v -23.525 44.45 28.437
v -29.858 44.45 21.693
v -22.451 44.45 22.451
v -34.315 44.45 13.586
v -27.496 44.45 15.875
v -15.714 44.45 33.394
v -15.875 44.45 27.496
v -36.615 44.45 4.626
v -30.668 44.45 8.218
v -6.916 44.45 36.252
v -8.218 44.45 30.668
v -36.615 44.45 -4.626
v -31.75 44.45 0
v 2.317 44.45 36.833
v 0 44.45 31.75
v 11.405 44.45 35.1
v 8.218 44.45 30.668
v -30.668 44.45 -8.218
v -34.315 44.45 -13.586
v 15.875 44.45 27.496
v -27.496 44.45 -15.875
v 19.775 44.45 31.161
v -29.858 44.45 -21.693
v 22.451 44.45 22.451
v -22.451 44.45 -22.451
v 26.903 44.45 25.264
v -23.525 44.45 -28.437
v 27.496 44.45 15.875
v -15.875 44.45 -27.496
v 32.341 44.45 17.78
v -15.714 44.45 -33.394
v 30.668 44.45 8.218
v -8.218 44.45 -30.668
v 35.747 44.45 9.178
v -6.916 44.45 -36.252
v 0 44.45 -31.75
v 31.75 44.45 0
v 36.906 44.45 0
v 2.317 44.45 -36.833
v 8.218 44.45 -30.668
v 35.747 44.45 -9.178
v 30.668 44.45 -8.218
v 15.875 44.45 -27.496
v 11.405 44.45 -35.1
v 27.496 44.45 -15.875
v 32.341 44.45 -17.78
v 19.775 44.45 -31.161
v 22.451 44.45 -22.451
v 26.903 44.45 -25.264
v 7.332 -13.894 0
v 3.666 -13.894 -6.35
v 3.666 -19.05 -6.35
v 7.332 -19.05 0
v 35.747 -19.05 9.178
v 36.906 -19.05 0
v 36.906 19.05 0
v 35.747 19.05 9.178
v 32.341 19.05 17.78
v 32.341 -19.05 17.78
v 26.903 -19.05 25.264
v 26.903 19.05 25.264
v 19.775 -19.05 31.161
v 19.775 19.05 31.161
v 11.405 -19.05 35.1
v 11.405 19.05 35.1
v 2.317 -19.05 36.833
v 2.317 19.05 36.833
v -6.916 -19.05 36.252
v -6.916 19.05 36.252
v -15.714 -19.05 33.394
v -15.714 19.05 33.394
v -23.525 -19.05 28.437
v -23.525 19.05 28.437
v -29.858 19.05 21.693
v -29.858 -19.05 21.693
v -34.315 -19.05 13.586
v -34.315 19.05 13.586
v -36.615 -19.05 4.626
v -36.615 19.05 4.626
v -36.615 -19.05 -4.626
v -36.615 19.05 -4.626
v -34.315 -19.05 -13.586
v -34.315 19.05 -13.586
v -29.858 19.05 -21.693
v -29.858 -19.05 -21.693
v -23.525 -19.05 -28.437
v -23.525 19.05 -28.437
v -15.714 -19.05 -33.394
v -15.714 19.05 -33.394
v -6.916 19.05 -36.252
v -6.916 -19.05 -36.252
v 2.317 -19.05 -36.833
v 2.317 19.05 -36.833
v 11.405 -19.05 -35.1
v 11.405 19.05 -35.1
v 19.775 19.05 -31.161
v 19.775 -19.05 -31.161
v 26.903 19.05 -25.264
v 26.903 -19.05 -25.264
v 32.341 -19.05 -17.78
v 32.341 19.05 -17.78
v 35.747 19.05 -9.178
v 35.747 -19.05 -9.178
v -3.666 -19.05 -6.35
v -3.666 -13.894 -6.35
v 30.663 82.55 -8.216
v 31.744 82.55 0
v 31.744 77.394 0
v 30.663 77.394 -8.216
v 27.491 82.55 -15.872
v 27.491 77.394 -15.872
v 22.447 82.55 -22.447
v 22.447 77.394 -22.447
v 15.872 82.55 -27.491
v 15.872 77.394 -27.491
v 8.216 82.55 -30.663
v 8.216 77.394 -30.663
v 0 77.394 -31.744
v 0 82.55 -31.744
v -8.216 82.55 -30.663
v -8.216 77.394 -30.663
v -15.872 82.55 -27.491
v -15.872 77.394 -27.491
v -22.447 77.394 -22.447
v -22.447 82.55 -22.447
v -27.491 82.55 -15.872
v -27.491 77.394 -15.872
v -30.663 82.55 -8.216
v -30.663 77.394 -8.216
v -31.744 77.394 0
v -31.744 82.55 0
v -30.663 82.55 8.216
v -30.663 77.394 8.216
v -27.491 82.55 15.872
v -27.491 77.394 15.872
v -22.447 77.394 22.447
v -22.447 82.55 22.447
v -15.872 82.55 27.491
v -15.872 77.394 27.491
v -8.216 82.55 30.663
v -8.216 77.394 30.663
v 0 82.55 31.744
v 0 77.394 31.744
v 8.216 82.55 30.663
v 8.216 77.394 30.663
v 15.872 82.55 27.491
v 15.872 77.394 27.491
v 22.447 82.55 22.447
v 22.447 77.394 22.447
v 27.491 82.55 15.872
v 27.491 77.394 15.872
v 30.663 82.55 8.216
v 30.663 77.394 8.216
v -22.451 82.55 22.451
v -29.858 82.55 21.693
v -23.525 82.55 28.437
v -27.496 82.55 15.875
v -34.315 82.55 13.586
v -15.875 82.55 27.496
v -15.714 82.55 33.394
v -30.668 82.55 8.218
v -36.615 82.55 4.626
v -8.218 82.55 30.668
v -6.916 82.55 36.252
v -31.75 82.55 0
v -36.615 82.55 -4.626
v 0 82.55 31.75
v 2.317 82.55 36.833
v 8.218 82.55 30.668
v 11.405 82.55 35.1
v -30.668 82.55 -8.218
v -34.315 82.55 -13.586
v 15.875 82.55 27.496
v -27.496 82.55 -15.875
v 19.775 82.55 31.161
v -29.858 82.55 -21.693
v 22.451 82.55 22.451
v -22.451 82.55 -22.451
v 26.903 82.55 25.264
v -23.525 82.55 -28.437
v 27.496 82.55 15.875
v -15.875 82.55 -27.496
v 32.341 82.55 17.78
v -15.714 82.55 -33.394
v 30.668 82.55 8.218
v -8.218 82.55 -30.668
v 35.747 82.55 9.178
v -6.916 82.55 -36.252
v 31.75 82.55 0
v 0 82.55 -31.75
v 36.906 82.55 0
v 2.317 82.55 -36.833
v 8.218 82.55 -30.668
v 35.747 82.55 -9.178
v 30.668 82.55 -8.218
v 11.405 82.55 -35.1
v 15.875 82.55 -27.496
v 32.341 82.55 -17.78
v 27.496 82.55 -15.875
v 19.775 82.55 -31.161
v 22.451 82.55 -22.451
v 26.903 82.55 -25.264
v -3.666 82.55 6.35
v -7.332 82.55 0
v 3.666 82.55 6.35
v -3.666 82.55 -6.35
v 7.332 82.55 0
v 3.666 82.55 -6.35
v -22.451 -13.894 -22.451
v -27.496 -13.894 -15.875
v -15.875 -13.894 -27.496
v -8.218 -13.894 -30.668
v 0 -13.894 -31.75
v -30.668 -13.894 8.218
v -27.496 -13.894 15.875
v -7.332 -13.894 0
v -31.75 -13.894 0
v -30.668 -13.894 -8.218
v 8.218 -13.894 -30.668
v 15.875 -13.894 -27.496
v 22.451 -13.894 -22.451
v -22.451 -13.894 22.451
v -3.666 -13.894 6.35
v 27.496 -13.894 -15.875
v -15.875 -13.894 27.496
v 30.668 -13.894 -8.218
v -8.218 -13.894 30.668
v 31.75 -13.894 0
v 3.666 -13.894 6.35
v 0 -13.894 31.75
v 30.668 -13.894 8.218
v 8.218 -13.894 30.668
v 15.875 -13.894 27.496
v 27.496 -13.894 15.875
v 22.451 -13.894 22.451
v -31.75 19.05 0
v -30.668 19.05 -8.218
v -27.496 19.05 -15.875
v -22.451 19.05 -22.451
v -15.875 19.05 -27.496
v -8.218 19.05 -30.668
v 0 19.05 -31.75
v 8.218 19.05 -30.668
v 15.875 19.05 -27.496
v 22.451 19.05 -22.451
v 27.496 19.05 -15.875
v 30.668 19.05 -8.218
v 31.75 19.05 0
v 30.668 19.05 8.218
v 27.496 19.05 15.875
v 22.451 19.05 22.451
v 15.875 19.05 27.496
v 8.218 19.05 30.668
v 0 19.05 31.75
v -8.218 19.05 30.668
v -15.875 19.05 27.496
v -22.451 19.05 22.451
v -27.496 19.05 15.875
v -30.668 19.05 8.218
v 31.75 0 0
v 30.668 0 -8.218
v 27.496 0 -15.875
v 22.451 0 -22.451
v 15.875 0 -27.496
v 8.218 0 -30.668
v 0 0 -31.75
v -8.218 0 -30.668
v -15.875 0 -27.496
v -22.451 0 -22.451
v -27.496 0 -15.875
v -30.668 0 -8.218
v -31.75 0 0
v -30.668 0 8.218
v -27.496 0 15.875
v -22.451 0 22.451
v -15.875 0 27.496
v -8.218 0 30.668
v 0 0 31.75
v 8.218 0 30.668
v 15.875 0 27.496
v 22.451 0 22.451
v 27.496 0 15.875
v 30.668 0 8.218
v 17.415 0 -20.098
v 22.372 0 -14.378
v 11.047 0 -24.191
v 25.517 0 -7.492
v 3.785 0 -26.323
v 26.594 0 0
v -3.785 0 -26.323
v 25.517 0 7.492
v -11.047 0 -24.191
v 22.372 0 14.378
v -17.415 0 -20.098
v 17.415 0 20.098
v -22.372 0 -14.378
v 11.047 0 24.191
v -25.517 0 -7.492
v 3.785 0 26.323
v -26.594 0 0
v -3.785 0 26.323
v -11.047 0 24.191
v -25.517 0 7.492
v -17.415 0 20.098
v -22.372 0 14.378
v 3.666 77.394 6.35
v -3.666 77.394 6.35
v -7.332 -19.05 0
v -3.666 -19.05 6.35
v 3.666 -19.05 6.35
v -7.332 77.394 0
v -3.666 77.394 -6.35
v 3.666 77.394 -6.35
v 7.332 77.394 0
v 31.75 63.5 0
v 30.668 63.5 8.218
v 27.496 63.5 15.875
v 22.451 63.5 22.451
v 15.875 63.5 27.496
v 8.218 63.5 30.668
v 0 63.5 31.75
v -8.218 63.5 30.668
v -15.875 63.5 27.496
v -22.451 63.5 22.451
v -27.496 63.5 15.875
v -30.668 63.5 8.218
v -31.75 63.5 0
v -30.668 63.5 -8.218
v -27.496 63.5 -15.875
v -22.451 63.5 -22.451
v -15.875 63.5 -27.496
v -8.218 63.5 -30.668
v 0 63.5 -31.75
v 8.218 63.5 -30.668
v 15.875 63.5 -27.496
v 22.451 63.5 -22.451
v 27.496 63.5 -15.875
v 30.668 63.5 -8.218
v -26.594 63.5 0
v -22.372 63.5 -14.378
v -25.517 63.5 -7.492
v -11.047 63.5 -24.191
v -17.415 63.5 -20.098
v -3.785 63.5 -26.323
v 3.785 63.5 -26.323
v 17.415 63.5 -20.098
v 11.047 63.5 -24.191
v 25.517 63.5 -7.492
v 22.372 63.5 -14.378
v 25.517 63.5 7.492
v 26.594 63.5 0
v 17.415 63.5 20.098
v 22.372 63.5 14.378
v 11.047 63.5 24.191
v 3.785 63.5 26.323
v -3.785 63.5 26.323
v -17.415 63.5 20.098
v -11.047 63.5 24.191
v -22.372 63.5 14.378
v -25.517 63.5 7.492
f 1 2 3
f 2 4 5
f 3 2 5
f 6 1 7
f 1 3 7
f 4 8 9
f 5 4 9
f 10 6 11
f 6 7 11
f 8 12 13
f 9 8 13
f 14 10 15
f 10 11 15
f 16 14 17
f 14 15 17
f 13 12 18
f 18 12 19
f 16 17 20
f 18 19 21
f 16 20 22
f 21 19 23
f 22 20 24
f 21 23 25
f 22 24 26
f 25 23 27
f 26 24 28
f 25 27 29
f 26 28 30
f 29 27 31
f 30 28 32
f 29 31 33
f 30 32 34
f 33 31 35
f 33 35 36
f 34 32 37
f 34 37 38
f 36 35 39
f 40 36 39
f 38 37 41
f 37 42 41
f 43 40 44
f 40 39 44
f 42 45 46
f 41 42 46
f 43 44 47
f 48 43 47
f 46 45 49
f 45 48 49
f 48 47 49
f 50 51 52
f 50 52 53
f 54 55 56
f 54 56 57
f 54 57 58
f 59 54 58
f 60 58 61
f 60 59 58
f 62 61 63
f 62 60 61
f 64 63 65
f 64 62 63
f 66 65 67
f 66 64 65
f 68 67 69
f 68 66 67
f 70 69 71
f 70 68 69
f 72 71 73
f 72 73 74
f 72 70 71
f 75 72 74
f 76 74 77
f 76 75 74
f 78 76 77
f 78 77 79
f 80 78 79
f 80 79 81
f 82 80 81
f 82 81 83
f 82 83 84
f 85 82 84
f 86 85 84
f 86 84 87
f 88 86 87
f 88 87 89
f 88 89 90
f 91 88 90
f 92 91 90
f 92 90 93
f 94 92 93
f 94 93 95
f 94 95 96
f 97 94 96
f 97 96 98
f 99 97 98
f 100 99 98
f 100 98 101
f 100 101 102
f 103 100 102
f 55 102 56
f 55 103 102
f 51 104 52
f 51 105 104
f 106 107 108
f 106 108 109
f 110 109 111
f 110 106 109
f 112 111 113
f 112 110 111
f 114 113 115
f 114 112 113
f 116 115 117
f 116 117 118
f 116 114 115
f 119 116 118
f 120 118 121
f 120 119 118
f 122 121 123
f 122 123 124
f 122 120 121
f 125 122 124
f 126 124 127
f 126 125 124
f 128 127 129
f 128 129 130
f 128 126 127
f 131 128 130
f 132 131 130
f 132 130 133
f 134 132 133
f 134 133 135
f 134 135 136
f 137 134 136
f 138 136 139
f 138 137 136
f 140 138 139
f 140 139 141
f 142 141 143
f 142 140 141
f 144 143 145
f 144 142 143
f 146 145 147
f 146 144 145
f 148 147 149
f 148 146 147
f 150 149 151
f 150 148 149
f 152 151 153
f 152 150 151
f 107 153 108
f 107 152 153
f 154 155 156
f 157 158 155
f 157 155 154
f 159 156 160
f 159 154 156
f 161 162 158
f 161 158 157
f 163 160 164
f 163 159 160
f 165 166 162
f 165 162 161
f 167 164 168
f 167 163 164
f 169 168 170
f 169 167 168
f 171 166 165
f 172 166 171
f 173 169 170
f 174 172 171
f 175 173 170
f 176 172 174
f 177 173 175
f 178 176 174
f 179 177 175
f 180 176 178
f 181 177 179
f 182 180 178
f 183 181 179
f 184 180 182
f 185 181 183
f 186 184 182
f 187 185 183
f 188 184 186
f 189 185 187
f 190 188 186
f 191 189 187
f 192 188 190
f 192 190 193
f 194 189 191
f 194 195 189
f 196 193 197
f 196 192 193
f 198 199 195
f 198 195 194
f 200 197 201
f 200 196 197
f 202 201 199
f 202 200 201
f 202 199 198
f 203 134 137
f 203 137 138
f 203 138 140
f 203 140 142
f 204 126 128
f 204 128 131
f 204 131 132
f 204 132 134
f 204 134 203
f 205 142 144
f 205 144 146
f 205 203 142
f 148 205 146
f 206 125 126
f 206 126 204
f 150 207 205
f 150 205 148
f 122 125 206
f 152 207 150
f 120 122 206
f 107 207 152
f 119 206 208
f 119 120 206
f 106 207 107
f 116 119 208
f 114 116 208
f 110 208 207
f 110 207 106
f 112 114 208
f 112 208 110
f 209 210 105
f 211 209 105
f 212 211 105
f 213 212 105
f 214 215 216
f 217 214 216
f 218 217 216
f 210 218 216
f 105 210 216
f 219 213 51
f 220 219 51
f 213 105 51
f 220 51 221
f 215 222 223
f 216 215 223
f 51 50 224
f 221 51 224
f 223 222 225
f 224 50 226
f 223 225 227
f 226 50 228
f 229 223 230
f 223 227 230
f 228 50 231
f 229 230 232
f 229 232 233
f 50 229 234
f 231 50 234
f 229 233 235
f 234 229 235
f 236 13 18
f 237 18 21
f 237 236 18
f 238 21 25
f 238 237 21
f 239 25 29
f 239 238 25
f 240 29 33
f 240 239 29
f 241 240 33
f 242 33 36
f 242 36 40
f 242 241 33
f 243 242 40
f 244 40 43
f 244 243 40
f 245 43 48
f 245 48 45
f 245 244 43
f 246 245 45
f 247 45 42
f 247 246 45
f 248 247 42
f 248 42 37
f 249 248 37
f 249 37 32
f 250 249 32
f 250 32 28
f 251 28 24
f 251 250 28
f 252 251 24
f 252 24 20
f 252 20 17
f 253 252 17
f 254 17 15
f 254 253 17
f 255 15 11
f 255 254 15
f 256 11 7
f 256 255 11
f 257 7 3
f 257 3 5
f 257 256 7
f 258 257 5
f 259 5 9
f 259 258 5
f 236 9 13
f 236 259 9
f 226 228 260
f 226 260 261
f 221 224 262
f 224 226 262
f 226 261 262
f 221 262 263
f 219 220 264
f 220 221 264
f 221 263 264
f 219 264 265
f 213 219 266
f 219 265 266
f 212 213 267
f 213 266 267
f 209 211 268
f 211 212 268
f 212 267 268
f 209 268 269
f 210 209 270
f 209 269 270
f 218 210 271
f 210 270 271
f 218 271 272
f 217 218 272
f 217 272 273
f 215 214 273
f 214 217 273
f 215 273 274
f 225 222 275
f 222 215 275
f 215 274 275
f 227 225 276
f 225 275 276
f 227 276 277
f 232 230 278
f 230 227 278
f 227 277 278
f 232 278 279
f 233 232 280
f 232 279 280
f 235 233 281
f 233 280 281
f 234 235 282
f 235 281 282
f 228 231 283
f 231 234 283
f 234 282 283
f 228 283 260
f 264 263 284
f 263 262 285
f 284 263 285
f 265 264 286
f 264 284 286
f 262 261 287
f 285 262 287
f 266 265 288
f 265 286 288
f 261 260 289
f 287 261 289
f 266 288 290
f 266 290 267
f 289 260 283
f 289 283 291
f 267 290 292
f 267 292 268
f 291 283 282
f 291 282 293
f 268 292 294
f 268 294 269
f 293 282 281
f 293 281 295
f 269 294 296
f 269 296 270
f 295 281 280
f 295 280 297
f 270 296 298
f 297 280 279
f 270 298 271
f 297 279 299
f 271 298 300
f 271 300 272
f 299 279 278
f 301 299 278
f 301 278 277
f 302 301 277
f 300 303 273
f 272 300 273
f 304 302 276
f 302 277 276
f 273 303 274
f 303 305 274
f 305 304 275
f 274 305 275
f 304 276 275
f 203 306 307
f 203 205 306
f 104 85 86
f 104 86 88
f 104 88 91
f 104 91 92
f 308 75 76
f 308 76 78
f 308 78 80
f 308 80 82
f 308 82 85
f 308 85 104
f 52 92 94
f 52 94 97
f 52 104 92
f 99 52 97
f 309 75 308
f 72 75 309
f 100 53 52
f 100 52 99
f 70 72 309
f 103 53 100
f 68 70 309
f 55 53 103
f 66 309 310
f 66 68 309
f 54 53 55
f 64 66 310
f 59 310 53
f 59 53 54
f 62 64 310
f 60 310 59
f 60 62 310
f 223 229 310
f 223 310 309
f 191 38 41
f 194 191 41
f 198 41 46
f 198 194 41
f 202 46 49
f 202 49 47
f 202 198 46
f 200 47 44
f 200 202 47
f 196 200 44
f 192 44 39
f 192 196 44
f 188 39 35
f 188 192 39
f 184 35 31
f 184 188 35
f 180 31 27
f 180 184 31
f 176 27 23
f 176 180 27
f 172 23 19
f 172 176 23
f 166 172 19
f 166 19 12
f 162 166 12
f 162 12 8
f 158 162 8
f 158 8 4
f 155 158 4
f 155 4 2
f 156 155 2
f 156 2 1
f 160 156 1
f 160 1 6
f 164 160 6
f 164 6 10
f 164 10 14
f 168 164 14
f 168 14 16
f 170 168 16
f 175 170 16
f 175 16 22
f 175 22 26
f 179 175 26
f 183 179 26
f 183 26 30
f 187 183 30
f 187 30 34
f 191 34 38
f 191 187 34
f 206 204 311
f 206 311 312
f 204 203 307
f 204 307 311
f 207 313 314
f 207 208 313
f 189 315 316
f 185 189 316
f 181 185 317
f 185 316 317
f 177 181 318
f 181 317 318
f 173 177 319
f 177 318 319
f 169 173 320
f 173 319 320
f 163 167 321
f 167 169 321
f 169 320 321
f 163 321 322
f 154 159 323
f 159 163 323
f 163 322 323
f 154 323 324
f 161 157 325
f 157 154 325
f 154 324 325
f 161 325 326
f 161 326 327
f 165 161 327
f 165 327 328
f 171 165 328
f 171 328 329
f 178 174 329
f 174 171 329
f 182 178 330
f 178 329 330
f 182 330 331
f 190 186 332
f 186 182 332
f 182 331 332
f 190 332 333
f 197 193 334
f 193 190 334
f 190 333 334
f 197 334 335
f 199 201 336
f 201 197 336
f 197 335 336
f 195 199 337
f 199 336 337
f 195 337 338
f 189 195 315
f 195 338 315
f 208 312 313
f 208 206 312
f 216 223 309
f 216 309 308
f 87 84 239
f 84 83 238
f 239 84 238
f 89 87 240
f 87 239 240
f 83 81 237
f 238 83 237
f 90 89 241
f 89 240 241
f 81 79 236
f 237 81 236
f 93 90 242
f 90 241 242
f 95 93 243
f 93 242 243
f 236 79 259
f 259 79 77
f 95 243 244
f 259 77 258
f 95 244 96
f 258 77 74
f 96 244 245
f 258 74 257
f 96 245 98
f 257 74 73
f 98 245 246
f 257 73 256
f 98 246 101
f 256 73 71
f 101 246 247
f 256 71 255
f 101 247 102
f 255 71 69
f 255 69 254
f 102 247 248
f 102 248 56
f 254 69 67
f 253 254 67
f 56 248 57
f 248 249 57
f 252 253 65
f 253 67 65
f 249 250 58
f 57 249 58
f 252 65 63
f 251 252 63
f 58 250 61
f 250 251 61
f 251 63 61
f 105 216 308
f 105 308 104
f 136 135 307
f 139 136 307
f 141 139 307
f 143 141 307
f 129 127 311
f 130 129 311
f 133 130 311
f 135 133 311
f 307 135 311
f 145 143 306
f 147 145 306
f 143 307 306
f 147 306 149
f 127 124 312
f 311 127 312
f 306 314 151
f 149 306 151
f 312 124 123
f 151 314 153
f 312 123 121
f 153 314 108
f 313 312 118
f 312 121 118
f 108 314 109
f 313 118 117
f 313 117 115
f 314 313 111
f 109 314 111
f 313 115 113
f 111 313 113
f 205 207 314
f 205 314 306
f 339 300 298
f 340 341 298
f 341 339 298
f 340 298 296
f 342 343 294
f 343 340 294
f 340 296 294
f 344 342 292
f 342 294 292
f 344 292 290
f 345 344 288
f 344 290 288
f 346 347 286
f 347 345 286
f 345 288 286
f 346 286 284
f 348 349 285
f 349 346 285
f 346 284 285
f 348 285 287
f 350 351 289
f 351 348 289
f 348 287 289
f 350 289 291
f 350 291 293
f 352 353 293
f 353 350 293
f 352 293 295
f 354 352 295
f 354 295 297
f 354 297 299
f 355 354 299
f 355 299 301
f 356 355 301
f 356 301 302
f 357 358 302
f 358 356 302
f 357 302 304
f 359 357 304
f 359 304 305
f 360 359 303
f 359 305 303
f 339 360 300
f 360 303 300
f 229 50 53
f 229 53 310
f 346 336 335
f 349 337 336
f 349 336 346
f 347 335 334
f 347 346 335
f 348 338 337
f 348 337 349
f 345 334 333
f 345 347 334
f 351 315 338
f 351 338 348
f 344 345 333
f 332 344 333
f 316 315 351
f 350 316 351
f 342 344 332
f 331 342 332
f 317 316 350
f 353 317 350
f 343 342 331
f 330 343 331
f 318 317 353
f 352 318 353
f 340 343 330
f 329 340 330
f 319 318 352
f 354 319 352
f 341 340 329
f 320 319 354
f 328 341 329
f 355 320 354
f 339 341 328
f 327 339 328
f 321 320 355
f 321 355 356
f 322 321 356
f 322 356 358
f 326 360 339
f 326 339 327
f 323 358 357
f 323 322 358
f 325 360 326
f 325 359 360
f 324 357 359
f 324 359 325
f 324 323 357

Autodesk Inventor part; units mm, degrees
ref_plane "YZ Plane" through (0, 0, 0) normal (1, 0, 0) x (0, 1, 0)
ref_plane "XZ Plane" through (0, 0, 0) normal (0, 1, 0) x (-1, 0, 0)
ref_plane "XY Plane" through (0, 0, 0) normal (0, 0, 1) x (1, 0, 0)
sketch "Sketch6" plane through (0, 0, 0) normal (0, 1, 0) x (-1, 0, 0)
  circle A0 centre (0, 0) radius 31.75
  circle A1 centre (0, 0) radius 26.5938
  dimension "d16" = 63.5
  dimension "d17" = 5.1562
extrude "Extrusion5" add sketch "Sketch6" along normal blind 63.5
sketch "Sketch7" plane through (0, 0, 0) normal (0, -1, 0) x (1, 0, 0)
  circle A0 centre (0, 0) radius 36.9062
  circle A1 centre (0, 0) radius 31.75
  dimension "d20" = 63.5
  dimension "d21" = 5.1562
extrude "Extrusion6" add sketch "Sketch7" along normal mid plane 38.1
sketch "Sketch8" plane through (0, -19.05, 0) normal (0, -1, 0) x (1, 0, 0)
  circle A0 centre (0, 0) radius 31.75
extrude "Extrusion7" add sketch "Sketch8" against normal blind 5.1562
sketch "Sketch9" plane through (0, 63.5, 0) normal (0, 1, 0) x (1, 0, 0)
  circle A0 centre (0, 0) radius 31.75
  circle A1 centre (0, 0) radius 36.9062
extrude "Extrusion8" add sketch "Sketch9" along normal mid plane 38.1
sketch "Sketch10" plane through (0, 82.55, 0) normal (0, 1, 0) x (1, 0, 0)
  circle A0 centre (0, 0) radius 31.7444
  dimension "d28" = 63.4887
extrude "Extrusion9" add sketch "Sketch10" against normal blind 5.1562
sketch "Sketch11" plane through (0, 82.55, 0) normal (0, 1, 0) x (1, 0, 0)
  line L0 (-7.3323, 0) -> (-3.6662, 6.35)
  line L1 (-3.6662, 6.35) -> (3.6662, 6.35)
  line L2 (3.6662, 6.35) -> (7.3323, 0)
  line L3 (7.3323, 0) -> (3.6662, -6.35)
  line L4 (3.6662, -6.35) -> (-3.6662, -6.35)
  line L5 (-3.6662, -6.35) -> (-7.3323, 0)
  point P0 (0, 0)
  point P1 (0, 0)
  dimension "d31" = 12.7
extrude "Extrusion10" cut sketch "Sketch11" against normal blind 228.6
properties part number "Roller Drum 4-Inch" material "PVC-Piping"
